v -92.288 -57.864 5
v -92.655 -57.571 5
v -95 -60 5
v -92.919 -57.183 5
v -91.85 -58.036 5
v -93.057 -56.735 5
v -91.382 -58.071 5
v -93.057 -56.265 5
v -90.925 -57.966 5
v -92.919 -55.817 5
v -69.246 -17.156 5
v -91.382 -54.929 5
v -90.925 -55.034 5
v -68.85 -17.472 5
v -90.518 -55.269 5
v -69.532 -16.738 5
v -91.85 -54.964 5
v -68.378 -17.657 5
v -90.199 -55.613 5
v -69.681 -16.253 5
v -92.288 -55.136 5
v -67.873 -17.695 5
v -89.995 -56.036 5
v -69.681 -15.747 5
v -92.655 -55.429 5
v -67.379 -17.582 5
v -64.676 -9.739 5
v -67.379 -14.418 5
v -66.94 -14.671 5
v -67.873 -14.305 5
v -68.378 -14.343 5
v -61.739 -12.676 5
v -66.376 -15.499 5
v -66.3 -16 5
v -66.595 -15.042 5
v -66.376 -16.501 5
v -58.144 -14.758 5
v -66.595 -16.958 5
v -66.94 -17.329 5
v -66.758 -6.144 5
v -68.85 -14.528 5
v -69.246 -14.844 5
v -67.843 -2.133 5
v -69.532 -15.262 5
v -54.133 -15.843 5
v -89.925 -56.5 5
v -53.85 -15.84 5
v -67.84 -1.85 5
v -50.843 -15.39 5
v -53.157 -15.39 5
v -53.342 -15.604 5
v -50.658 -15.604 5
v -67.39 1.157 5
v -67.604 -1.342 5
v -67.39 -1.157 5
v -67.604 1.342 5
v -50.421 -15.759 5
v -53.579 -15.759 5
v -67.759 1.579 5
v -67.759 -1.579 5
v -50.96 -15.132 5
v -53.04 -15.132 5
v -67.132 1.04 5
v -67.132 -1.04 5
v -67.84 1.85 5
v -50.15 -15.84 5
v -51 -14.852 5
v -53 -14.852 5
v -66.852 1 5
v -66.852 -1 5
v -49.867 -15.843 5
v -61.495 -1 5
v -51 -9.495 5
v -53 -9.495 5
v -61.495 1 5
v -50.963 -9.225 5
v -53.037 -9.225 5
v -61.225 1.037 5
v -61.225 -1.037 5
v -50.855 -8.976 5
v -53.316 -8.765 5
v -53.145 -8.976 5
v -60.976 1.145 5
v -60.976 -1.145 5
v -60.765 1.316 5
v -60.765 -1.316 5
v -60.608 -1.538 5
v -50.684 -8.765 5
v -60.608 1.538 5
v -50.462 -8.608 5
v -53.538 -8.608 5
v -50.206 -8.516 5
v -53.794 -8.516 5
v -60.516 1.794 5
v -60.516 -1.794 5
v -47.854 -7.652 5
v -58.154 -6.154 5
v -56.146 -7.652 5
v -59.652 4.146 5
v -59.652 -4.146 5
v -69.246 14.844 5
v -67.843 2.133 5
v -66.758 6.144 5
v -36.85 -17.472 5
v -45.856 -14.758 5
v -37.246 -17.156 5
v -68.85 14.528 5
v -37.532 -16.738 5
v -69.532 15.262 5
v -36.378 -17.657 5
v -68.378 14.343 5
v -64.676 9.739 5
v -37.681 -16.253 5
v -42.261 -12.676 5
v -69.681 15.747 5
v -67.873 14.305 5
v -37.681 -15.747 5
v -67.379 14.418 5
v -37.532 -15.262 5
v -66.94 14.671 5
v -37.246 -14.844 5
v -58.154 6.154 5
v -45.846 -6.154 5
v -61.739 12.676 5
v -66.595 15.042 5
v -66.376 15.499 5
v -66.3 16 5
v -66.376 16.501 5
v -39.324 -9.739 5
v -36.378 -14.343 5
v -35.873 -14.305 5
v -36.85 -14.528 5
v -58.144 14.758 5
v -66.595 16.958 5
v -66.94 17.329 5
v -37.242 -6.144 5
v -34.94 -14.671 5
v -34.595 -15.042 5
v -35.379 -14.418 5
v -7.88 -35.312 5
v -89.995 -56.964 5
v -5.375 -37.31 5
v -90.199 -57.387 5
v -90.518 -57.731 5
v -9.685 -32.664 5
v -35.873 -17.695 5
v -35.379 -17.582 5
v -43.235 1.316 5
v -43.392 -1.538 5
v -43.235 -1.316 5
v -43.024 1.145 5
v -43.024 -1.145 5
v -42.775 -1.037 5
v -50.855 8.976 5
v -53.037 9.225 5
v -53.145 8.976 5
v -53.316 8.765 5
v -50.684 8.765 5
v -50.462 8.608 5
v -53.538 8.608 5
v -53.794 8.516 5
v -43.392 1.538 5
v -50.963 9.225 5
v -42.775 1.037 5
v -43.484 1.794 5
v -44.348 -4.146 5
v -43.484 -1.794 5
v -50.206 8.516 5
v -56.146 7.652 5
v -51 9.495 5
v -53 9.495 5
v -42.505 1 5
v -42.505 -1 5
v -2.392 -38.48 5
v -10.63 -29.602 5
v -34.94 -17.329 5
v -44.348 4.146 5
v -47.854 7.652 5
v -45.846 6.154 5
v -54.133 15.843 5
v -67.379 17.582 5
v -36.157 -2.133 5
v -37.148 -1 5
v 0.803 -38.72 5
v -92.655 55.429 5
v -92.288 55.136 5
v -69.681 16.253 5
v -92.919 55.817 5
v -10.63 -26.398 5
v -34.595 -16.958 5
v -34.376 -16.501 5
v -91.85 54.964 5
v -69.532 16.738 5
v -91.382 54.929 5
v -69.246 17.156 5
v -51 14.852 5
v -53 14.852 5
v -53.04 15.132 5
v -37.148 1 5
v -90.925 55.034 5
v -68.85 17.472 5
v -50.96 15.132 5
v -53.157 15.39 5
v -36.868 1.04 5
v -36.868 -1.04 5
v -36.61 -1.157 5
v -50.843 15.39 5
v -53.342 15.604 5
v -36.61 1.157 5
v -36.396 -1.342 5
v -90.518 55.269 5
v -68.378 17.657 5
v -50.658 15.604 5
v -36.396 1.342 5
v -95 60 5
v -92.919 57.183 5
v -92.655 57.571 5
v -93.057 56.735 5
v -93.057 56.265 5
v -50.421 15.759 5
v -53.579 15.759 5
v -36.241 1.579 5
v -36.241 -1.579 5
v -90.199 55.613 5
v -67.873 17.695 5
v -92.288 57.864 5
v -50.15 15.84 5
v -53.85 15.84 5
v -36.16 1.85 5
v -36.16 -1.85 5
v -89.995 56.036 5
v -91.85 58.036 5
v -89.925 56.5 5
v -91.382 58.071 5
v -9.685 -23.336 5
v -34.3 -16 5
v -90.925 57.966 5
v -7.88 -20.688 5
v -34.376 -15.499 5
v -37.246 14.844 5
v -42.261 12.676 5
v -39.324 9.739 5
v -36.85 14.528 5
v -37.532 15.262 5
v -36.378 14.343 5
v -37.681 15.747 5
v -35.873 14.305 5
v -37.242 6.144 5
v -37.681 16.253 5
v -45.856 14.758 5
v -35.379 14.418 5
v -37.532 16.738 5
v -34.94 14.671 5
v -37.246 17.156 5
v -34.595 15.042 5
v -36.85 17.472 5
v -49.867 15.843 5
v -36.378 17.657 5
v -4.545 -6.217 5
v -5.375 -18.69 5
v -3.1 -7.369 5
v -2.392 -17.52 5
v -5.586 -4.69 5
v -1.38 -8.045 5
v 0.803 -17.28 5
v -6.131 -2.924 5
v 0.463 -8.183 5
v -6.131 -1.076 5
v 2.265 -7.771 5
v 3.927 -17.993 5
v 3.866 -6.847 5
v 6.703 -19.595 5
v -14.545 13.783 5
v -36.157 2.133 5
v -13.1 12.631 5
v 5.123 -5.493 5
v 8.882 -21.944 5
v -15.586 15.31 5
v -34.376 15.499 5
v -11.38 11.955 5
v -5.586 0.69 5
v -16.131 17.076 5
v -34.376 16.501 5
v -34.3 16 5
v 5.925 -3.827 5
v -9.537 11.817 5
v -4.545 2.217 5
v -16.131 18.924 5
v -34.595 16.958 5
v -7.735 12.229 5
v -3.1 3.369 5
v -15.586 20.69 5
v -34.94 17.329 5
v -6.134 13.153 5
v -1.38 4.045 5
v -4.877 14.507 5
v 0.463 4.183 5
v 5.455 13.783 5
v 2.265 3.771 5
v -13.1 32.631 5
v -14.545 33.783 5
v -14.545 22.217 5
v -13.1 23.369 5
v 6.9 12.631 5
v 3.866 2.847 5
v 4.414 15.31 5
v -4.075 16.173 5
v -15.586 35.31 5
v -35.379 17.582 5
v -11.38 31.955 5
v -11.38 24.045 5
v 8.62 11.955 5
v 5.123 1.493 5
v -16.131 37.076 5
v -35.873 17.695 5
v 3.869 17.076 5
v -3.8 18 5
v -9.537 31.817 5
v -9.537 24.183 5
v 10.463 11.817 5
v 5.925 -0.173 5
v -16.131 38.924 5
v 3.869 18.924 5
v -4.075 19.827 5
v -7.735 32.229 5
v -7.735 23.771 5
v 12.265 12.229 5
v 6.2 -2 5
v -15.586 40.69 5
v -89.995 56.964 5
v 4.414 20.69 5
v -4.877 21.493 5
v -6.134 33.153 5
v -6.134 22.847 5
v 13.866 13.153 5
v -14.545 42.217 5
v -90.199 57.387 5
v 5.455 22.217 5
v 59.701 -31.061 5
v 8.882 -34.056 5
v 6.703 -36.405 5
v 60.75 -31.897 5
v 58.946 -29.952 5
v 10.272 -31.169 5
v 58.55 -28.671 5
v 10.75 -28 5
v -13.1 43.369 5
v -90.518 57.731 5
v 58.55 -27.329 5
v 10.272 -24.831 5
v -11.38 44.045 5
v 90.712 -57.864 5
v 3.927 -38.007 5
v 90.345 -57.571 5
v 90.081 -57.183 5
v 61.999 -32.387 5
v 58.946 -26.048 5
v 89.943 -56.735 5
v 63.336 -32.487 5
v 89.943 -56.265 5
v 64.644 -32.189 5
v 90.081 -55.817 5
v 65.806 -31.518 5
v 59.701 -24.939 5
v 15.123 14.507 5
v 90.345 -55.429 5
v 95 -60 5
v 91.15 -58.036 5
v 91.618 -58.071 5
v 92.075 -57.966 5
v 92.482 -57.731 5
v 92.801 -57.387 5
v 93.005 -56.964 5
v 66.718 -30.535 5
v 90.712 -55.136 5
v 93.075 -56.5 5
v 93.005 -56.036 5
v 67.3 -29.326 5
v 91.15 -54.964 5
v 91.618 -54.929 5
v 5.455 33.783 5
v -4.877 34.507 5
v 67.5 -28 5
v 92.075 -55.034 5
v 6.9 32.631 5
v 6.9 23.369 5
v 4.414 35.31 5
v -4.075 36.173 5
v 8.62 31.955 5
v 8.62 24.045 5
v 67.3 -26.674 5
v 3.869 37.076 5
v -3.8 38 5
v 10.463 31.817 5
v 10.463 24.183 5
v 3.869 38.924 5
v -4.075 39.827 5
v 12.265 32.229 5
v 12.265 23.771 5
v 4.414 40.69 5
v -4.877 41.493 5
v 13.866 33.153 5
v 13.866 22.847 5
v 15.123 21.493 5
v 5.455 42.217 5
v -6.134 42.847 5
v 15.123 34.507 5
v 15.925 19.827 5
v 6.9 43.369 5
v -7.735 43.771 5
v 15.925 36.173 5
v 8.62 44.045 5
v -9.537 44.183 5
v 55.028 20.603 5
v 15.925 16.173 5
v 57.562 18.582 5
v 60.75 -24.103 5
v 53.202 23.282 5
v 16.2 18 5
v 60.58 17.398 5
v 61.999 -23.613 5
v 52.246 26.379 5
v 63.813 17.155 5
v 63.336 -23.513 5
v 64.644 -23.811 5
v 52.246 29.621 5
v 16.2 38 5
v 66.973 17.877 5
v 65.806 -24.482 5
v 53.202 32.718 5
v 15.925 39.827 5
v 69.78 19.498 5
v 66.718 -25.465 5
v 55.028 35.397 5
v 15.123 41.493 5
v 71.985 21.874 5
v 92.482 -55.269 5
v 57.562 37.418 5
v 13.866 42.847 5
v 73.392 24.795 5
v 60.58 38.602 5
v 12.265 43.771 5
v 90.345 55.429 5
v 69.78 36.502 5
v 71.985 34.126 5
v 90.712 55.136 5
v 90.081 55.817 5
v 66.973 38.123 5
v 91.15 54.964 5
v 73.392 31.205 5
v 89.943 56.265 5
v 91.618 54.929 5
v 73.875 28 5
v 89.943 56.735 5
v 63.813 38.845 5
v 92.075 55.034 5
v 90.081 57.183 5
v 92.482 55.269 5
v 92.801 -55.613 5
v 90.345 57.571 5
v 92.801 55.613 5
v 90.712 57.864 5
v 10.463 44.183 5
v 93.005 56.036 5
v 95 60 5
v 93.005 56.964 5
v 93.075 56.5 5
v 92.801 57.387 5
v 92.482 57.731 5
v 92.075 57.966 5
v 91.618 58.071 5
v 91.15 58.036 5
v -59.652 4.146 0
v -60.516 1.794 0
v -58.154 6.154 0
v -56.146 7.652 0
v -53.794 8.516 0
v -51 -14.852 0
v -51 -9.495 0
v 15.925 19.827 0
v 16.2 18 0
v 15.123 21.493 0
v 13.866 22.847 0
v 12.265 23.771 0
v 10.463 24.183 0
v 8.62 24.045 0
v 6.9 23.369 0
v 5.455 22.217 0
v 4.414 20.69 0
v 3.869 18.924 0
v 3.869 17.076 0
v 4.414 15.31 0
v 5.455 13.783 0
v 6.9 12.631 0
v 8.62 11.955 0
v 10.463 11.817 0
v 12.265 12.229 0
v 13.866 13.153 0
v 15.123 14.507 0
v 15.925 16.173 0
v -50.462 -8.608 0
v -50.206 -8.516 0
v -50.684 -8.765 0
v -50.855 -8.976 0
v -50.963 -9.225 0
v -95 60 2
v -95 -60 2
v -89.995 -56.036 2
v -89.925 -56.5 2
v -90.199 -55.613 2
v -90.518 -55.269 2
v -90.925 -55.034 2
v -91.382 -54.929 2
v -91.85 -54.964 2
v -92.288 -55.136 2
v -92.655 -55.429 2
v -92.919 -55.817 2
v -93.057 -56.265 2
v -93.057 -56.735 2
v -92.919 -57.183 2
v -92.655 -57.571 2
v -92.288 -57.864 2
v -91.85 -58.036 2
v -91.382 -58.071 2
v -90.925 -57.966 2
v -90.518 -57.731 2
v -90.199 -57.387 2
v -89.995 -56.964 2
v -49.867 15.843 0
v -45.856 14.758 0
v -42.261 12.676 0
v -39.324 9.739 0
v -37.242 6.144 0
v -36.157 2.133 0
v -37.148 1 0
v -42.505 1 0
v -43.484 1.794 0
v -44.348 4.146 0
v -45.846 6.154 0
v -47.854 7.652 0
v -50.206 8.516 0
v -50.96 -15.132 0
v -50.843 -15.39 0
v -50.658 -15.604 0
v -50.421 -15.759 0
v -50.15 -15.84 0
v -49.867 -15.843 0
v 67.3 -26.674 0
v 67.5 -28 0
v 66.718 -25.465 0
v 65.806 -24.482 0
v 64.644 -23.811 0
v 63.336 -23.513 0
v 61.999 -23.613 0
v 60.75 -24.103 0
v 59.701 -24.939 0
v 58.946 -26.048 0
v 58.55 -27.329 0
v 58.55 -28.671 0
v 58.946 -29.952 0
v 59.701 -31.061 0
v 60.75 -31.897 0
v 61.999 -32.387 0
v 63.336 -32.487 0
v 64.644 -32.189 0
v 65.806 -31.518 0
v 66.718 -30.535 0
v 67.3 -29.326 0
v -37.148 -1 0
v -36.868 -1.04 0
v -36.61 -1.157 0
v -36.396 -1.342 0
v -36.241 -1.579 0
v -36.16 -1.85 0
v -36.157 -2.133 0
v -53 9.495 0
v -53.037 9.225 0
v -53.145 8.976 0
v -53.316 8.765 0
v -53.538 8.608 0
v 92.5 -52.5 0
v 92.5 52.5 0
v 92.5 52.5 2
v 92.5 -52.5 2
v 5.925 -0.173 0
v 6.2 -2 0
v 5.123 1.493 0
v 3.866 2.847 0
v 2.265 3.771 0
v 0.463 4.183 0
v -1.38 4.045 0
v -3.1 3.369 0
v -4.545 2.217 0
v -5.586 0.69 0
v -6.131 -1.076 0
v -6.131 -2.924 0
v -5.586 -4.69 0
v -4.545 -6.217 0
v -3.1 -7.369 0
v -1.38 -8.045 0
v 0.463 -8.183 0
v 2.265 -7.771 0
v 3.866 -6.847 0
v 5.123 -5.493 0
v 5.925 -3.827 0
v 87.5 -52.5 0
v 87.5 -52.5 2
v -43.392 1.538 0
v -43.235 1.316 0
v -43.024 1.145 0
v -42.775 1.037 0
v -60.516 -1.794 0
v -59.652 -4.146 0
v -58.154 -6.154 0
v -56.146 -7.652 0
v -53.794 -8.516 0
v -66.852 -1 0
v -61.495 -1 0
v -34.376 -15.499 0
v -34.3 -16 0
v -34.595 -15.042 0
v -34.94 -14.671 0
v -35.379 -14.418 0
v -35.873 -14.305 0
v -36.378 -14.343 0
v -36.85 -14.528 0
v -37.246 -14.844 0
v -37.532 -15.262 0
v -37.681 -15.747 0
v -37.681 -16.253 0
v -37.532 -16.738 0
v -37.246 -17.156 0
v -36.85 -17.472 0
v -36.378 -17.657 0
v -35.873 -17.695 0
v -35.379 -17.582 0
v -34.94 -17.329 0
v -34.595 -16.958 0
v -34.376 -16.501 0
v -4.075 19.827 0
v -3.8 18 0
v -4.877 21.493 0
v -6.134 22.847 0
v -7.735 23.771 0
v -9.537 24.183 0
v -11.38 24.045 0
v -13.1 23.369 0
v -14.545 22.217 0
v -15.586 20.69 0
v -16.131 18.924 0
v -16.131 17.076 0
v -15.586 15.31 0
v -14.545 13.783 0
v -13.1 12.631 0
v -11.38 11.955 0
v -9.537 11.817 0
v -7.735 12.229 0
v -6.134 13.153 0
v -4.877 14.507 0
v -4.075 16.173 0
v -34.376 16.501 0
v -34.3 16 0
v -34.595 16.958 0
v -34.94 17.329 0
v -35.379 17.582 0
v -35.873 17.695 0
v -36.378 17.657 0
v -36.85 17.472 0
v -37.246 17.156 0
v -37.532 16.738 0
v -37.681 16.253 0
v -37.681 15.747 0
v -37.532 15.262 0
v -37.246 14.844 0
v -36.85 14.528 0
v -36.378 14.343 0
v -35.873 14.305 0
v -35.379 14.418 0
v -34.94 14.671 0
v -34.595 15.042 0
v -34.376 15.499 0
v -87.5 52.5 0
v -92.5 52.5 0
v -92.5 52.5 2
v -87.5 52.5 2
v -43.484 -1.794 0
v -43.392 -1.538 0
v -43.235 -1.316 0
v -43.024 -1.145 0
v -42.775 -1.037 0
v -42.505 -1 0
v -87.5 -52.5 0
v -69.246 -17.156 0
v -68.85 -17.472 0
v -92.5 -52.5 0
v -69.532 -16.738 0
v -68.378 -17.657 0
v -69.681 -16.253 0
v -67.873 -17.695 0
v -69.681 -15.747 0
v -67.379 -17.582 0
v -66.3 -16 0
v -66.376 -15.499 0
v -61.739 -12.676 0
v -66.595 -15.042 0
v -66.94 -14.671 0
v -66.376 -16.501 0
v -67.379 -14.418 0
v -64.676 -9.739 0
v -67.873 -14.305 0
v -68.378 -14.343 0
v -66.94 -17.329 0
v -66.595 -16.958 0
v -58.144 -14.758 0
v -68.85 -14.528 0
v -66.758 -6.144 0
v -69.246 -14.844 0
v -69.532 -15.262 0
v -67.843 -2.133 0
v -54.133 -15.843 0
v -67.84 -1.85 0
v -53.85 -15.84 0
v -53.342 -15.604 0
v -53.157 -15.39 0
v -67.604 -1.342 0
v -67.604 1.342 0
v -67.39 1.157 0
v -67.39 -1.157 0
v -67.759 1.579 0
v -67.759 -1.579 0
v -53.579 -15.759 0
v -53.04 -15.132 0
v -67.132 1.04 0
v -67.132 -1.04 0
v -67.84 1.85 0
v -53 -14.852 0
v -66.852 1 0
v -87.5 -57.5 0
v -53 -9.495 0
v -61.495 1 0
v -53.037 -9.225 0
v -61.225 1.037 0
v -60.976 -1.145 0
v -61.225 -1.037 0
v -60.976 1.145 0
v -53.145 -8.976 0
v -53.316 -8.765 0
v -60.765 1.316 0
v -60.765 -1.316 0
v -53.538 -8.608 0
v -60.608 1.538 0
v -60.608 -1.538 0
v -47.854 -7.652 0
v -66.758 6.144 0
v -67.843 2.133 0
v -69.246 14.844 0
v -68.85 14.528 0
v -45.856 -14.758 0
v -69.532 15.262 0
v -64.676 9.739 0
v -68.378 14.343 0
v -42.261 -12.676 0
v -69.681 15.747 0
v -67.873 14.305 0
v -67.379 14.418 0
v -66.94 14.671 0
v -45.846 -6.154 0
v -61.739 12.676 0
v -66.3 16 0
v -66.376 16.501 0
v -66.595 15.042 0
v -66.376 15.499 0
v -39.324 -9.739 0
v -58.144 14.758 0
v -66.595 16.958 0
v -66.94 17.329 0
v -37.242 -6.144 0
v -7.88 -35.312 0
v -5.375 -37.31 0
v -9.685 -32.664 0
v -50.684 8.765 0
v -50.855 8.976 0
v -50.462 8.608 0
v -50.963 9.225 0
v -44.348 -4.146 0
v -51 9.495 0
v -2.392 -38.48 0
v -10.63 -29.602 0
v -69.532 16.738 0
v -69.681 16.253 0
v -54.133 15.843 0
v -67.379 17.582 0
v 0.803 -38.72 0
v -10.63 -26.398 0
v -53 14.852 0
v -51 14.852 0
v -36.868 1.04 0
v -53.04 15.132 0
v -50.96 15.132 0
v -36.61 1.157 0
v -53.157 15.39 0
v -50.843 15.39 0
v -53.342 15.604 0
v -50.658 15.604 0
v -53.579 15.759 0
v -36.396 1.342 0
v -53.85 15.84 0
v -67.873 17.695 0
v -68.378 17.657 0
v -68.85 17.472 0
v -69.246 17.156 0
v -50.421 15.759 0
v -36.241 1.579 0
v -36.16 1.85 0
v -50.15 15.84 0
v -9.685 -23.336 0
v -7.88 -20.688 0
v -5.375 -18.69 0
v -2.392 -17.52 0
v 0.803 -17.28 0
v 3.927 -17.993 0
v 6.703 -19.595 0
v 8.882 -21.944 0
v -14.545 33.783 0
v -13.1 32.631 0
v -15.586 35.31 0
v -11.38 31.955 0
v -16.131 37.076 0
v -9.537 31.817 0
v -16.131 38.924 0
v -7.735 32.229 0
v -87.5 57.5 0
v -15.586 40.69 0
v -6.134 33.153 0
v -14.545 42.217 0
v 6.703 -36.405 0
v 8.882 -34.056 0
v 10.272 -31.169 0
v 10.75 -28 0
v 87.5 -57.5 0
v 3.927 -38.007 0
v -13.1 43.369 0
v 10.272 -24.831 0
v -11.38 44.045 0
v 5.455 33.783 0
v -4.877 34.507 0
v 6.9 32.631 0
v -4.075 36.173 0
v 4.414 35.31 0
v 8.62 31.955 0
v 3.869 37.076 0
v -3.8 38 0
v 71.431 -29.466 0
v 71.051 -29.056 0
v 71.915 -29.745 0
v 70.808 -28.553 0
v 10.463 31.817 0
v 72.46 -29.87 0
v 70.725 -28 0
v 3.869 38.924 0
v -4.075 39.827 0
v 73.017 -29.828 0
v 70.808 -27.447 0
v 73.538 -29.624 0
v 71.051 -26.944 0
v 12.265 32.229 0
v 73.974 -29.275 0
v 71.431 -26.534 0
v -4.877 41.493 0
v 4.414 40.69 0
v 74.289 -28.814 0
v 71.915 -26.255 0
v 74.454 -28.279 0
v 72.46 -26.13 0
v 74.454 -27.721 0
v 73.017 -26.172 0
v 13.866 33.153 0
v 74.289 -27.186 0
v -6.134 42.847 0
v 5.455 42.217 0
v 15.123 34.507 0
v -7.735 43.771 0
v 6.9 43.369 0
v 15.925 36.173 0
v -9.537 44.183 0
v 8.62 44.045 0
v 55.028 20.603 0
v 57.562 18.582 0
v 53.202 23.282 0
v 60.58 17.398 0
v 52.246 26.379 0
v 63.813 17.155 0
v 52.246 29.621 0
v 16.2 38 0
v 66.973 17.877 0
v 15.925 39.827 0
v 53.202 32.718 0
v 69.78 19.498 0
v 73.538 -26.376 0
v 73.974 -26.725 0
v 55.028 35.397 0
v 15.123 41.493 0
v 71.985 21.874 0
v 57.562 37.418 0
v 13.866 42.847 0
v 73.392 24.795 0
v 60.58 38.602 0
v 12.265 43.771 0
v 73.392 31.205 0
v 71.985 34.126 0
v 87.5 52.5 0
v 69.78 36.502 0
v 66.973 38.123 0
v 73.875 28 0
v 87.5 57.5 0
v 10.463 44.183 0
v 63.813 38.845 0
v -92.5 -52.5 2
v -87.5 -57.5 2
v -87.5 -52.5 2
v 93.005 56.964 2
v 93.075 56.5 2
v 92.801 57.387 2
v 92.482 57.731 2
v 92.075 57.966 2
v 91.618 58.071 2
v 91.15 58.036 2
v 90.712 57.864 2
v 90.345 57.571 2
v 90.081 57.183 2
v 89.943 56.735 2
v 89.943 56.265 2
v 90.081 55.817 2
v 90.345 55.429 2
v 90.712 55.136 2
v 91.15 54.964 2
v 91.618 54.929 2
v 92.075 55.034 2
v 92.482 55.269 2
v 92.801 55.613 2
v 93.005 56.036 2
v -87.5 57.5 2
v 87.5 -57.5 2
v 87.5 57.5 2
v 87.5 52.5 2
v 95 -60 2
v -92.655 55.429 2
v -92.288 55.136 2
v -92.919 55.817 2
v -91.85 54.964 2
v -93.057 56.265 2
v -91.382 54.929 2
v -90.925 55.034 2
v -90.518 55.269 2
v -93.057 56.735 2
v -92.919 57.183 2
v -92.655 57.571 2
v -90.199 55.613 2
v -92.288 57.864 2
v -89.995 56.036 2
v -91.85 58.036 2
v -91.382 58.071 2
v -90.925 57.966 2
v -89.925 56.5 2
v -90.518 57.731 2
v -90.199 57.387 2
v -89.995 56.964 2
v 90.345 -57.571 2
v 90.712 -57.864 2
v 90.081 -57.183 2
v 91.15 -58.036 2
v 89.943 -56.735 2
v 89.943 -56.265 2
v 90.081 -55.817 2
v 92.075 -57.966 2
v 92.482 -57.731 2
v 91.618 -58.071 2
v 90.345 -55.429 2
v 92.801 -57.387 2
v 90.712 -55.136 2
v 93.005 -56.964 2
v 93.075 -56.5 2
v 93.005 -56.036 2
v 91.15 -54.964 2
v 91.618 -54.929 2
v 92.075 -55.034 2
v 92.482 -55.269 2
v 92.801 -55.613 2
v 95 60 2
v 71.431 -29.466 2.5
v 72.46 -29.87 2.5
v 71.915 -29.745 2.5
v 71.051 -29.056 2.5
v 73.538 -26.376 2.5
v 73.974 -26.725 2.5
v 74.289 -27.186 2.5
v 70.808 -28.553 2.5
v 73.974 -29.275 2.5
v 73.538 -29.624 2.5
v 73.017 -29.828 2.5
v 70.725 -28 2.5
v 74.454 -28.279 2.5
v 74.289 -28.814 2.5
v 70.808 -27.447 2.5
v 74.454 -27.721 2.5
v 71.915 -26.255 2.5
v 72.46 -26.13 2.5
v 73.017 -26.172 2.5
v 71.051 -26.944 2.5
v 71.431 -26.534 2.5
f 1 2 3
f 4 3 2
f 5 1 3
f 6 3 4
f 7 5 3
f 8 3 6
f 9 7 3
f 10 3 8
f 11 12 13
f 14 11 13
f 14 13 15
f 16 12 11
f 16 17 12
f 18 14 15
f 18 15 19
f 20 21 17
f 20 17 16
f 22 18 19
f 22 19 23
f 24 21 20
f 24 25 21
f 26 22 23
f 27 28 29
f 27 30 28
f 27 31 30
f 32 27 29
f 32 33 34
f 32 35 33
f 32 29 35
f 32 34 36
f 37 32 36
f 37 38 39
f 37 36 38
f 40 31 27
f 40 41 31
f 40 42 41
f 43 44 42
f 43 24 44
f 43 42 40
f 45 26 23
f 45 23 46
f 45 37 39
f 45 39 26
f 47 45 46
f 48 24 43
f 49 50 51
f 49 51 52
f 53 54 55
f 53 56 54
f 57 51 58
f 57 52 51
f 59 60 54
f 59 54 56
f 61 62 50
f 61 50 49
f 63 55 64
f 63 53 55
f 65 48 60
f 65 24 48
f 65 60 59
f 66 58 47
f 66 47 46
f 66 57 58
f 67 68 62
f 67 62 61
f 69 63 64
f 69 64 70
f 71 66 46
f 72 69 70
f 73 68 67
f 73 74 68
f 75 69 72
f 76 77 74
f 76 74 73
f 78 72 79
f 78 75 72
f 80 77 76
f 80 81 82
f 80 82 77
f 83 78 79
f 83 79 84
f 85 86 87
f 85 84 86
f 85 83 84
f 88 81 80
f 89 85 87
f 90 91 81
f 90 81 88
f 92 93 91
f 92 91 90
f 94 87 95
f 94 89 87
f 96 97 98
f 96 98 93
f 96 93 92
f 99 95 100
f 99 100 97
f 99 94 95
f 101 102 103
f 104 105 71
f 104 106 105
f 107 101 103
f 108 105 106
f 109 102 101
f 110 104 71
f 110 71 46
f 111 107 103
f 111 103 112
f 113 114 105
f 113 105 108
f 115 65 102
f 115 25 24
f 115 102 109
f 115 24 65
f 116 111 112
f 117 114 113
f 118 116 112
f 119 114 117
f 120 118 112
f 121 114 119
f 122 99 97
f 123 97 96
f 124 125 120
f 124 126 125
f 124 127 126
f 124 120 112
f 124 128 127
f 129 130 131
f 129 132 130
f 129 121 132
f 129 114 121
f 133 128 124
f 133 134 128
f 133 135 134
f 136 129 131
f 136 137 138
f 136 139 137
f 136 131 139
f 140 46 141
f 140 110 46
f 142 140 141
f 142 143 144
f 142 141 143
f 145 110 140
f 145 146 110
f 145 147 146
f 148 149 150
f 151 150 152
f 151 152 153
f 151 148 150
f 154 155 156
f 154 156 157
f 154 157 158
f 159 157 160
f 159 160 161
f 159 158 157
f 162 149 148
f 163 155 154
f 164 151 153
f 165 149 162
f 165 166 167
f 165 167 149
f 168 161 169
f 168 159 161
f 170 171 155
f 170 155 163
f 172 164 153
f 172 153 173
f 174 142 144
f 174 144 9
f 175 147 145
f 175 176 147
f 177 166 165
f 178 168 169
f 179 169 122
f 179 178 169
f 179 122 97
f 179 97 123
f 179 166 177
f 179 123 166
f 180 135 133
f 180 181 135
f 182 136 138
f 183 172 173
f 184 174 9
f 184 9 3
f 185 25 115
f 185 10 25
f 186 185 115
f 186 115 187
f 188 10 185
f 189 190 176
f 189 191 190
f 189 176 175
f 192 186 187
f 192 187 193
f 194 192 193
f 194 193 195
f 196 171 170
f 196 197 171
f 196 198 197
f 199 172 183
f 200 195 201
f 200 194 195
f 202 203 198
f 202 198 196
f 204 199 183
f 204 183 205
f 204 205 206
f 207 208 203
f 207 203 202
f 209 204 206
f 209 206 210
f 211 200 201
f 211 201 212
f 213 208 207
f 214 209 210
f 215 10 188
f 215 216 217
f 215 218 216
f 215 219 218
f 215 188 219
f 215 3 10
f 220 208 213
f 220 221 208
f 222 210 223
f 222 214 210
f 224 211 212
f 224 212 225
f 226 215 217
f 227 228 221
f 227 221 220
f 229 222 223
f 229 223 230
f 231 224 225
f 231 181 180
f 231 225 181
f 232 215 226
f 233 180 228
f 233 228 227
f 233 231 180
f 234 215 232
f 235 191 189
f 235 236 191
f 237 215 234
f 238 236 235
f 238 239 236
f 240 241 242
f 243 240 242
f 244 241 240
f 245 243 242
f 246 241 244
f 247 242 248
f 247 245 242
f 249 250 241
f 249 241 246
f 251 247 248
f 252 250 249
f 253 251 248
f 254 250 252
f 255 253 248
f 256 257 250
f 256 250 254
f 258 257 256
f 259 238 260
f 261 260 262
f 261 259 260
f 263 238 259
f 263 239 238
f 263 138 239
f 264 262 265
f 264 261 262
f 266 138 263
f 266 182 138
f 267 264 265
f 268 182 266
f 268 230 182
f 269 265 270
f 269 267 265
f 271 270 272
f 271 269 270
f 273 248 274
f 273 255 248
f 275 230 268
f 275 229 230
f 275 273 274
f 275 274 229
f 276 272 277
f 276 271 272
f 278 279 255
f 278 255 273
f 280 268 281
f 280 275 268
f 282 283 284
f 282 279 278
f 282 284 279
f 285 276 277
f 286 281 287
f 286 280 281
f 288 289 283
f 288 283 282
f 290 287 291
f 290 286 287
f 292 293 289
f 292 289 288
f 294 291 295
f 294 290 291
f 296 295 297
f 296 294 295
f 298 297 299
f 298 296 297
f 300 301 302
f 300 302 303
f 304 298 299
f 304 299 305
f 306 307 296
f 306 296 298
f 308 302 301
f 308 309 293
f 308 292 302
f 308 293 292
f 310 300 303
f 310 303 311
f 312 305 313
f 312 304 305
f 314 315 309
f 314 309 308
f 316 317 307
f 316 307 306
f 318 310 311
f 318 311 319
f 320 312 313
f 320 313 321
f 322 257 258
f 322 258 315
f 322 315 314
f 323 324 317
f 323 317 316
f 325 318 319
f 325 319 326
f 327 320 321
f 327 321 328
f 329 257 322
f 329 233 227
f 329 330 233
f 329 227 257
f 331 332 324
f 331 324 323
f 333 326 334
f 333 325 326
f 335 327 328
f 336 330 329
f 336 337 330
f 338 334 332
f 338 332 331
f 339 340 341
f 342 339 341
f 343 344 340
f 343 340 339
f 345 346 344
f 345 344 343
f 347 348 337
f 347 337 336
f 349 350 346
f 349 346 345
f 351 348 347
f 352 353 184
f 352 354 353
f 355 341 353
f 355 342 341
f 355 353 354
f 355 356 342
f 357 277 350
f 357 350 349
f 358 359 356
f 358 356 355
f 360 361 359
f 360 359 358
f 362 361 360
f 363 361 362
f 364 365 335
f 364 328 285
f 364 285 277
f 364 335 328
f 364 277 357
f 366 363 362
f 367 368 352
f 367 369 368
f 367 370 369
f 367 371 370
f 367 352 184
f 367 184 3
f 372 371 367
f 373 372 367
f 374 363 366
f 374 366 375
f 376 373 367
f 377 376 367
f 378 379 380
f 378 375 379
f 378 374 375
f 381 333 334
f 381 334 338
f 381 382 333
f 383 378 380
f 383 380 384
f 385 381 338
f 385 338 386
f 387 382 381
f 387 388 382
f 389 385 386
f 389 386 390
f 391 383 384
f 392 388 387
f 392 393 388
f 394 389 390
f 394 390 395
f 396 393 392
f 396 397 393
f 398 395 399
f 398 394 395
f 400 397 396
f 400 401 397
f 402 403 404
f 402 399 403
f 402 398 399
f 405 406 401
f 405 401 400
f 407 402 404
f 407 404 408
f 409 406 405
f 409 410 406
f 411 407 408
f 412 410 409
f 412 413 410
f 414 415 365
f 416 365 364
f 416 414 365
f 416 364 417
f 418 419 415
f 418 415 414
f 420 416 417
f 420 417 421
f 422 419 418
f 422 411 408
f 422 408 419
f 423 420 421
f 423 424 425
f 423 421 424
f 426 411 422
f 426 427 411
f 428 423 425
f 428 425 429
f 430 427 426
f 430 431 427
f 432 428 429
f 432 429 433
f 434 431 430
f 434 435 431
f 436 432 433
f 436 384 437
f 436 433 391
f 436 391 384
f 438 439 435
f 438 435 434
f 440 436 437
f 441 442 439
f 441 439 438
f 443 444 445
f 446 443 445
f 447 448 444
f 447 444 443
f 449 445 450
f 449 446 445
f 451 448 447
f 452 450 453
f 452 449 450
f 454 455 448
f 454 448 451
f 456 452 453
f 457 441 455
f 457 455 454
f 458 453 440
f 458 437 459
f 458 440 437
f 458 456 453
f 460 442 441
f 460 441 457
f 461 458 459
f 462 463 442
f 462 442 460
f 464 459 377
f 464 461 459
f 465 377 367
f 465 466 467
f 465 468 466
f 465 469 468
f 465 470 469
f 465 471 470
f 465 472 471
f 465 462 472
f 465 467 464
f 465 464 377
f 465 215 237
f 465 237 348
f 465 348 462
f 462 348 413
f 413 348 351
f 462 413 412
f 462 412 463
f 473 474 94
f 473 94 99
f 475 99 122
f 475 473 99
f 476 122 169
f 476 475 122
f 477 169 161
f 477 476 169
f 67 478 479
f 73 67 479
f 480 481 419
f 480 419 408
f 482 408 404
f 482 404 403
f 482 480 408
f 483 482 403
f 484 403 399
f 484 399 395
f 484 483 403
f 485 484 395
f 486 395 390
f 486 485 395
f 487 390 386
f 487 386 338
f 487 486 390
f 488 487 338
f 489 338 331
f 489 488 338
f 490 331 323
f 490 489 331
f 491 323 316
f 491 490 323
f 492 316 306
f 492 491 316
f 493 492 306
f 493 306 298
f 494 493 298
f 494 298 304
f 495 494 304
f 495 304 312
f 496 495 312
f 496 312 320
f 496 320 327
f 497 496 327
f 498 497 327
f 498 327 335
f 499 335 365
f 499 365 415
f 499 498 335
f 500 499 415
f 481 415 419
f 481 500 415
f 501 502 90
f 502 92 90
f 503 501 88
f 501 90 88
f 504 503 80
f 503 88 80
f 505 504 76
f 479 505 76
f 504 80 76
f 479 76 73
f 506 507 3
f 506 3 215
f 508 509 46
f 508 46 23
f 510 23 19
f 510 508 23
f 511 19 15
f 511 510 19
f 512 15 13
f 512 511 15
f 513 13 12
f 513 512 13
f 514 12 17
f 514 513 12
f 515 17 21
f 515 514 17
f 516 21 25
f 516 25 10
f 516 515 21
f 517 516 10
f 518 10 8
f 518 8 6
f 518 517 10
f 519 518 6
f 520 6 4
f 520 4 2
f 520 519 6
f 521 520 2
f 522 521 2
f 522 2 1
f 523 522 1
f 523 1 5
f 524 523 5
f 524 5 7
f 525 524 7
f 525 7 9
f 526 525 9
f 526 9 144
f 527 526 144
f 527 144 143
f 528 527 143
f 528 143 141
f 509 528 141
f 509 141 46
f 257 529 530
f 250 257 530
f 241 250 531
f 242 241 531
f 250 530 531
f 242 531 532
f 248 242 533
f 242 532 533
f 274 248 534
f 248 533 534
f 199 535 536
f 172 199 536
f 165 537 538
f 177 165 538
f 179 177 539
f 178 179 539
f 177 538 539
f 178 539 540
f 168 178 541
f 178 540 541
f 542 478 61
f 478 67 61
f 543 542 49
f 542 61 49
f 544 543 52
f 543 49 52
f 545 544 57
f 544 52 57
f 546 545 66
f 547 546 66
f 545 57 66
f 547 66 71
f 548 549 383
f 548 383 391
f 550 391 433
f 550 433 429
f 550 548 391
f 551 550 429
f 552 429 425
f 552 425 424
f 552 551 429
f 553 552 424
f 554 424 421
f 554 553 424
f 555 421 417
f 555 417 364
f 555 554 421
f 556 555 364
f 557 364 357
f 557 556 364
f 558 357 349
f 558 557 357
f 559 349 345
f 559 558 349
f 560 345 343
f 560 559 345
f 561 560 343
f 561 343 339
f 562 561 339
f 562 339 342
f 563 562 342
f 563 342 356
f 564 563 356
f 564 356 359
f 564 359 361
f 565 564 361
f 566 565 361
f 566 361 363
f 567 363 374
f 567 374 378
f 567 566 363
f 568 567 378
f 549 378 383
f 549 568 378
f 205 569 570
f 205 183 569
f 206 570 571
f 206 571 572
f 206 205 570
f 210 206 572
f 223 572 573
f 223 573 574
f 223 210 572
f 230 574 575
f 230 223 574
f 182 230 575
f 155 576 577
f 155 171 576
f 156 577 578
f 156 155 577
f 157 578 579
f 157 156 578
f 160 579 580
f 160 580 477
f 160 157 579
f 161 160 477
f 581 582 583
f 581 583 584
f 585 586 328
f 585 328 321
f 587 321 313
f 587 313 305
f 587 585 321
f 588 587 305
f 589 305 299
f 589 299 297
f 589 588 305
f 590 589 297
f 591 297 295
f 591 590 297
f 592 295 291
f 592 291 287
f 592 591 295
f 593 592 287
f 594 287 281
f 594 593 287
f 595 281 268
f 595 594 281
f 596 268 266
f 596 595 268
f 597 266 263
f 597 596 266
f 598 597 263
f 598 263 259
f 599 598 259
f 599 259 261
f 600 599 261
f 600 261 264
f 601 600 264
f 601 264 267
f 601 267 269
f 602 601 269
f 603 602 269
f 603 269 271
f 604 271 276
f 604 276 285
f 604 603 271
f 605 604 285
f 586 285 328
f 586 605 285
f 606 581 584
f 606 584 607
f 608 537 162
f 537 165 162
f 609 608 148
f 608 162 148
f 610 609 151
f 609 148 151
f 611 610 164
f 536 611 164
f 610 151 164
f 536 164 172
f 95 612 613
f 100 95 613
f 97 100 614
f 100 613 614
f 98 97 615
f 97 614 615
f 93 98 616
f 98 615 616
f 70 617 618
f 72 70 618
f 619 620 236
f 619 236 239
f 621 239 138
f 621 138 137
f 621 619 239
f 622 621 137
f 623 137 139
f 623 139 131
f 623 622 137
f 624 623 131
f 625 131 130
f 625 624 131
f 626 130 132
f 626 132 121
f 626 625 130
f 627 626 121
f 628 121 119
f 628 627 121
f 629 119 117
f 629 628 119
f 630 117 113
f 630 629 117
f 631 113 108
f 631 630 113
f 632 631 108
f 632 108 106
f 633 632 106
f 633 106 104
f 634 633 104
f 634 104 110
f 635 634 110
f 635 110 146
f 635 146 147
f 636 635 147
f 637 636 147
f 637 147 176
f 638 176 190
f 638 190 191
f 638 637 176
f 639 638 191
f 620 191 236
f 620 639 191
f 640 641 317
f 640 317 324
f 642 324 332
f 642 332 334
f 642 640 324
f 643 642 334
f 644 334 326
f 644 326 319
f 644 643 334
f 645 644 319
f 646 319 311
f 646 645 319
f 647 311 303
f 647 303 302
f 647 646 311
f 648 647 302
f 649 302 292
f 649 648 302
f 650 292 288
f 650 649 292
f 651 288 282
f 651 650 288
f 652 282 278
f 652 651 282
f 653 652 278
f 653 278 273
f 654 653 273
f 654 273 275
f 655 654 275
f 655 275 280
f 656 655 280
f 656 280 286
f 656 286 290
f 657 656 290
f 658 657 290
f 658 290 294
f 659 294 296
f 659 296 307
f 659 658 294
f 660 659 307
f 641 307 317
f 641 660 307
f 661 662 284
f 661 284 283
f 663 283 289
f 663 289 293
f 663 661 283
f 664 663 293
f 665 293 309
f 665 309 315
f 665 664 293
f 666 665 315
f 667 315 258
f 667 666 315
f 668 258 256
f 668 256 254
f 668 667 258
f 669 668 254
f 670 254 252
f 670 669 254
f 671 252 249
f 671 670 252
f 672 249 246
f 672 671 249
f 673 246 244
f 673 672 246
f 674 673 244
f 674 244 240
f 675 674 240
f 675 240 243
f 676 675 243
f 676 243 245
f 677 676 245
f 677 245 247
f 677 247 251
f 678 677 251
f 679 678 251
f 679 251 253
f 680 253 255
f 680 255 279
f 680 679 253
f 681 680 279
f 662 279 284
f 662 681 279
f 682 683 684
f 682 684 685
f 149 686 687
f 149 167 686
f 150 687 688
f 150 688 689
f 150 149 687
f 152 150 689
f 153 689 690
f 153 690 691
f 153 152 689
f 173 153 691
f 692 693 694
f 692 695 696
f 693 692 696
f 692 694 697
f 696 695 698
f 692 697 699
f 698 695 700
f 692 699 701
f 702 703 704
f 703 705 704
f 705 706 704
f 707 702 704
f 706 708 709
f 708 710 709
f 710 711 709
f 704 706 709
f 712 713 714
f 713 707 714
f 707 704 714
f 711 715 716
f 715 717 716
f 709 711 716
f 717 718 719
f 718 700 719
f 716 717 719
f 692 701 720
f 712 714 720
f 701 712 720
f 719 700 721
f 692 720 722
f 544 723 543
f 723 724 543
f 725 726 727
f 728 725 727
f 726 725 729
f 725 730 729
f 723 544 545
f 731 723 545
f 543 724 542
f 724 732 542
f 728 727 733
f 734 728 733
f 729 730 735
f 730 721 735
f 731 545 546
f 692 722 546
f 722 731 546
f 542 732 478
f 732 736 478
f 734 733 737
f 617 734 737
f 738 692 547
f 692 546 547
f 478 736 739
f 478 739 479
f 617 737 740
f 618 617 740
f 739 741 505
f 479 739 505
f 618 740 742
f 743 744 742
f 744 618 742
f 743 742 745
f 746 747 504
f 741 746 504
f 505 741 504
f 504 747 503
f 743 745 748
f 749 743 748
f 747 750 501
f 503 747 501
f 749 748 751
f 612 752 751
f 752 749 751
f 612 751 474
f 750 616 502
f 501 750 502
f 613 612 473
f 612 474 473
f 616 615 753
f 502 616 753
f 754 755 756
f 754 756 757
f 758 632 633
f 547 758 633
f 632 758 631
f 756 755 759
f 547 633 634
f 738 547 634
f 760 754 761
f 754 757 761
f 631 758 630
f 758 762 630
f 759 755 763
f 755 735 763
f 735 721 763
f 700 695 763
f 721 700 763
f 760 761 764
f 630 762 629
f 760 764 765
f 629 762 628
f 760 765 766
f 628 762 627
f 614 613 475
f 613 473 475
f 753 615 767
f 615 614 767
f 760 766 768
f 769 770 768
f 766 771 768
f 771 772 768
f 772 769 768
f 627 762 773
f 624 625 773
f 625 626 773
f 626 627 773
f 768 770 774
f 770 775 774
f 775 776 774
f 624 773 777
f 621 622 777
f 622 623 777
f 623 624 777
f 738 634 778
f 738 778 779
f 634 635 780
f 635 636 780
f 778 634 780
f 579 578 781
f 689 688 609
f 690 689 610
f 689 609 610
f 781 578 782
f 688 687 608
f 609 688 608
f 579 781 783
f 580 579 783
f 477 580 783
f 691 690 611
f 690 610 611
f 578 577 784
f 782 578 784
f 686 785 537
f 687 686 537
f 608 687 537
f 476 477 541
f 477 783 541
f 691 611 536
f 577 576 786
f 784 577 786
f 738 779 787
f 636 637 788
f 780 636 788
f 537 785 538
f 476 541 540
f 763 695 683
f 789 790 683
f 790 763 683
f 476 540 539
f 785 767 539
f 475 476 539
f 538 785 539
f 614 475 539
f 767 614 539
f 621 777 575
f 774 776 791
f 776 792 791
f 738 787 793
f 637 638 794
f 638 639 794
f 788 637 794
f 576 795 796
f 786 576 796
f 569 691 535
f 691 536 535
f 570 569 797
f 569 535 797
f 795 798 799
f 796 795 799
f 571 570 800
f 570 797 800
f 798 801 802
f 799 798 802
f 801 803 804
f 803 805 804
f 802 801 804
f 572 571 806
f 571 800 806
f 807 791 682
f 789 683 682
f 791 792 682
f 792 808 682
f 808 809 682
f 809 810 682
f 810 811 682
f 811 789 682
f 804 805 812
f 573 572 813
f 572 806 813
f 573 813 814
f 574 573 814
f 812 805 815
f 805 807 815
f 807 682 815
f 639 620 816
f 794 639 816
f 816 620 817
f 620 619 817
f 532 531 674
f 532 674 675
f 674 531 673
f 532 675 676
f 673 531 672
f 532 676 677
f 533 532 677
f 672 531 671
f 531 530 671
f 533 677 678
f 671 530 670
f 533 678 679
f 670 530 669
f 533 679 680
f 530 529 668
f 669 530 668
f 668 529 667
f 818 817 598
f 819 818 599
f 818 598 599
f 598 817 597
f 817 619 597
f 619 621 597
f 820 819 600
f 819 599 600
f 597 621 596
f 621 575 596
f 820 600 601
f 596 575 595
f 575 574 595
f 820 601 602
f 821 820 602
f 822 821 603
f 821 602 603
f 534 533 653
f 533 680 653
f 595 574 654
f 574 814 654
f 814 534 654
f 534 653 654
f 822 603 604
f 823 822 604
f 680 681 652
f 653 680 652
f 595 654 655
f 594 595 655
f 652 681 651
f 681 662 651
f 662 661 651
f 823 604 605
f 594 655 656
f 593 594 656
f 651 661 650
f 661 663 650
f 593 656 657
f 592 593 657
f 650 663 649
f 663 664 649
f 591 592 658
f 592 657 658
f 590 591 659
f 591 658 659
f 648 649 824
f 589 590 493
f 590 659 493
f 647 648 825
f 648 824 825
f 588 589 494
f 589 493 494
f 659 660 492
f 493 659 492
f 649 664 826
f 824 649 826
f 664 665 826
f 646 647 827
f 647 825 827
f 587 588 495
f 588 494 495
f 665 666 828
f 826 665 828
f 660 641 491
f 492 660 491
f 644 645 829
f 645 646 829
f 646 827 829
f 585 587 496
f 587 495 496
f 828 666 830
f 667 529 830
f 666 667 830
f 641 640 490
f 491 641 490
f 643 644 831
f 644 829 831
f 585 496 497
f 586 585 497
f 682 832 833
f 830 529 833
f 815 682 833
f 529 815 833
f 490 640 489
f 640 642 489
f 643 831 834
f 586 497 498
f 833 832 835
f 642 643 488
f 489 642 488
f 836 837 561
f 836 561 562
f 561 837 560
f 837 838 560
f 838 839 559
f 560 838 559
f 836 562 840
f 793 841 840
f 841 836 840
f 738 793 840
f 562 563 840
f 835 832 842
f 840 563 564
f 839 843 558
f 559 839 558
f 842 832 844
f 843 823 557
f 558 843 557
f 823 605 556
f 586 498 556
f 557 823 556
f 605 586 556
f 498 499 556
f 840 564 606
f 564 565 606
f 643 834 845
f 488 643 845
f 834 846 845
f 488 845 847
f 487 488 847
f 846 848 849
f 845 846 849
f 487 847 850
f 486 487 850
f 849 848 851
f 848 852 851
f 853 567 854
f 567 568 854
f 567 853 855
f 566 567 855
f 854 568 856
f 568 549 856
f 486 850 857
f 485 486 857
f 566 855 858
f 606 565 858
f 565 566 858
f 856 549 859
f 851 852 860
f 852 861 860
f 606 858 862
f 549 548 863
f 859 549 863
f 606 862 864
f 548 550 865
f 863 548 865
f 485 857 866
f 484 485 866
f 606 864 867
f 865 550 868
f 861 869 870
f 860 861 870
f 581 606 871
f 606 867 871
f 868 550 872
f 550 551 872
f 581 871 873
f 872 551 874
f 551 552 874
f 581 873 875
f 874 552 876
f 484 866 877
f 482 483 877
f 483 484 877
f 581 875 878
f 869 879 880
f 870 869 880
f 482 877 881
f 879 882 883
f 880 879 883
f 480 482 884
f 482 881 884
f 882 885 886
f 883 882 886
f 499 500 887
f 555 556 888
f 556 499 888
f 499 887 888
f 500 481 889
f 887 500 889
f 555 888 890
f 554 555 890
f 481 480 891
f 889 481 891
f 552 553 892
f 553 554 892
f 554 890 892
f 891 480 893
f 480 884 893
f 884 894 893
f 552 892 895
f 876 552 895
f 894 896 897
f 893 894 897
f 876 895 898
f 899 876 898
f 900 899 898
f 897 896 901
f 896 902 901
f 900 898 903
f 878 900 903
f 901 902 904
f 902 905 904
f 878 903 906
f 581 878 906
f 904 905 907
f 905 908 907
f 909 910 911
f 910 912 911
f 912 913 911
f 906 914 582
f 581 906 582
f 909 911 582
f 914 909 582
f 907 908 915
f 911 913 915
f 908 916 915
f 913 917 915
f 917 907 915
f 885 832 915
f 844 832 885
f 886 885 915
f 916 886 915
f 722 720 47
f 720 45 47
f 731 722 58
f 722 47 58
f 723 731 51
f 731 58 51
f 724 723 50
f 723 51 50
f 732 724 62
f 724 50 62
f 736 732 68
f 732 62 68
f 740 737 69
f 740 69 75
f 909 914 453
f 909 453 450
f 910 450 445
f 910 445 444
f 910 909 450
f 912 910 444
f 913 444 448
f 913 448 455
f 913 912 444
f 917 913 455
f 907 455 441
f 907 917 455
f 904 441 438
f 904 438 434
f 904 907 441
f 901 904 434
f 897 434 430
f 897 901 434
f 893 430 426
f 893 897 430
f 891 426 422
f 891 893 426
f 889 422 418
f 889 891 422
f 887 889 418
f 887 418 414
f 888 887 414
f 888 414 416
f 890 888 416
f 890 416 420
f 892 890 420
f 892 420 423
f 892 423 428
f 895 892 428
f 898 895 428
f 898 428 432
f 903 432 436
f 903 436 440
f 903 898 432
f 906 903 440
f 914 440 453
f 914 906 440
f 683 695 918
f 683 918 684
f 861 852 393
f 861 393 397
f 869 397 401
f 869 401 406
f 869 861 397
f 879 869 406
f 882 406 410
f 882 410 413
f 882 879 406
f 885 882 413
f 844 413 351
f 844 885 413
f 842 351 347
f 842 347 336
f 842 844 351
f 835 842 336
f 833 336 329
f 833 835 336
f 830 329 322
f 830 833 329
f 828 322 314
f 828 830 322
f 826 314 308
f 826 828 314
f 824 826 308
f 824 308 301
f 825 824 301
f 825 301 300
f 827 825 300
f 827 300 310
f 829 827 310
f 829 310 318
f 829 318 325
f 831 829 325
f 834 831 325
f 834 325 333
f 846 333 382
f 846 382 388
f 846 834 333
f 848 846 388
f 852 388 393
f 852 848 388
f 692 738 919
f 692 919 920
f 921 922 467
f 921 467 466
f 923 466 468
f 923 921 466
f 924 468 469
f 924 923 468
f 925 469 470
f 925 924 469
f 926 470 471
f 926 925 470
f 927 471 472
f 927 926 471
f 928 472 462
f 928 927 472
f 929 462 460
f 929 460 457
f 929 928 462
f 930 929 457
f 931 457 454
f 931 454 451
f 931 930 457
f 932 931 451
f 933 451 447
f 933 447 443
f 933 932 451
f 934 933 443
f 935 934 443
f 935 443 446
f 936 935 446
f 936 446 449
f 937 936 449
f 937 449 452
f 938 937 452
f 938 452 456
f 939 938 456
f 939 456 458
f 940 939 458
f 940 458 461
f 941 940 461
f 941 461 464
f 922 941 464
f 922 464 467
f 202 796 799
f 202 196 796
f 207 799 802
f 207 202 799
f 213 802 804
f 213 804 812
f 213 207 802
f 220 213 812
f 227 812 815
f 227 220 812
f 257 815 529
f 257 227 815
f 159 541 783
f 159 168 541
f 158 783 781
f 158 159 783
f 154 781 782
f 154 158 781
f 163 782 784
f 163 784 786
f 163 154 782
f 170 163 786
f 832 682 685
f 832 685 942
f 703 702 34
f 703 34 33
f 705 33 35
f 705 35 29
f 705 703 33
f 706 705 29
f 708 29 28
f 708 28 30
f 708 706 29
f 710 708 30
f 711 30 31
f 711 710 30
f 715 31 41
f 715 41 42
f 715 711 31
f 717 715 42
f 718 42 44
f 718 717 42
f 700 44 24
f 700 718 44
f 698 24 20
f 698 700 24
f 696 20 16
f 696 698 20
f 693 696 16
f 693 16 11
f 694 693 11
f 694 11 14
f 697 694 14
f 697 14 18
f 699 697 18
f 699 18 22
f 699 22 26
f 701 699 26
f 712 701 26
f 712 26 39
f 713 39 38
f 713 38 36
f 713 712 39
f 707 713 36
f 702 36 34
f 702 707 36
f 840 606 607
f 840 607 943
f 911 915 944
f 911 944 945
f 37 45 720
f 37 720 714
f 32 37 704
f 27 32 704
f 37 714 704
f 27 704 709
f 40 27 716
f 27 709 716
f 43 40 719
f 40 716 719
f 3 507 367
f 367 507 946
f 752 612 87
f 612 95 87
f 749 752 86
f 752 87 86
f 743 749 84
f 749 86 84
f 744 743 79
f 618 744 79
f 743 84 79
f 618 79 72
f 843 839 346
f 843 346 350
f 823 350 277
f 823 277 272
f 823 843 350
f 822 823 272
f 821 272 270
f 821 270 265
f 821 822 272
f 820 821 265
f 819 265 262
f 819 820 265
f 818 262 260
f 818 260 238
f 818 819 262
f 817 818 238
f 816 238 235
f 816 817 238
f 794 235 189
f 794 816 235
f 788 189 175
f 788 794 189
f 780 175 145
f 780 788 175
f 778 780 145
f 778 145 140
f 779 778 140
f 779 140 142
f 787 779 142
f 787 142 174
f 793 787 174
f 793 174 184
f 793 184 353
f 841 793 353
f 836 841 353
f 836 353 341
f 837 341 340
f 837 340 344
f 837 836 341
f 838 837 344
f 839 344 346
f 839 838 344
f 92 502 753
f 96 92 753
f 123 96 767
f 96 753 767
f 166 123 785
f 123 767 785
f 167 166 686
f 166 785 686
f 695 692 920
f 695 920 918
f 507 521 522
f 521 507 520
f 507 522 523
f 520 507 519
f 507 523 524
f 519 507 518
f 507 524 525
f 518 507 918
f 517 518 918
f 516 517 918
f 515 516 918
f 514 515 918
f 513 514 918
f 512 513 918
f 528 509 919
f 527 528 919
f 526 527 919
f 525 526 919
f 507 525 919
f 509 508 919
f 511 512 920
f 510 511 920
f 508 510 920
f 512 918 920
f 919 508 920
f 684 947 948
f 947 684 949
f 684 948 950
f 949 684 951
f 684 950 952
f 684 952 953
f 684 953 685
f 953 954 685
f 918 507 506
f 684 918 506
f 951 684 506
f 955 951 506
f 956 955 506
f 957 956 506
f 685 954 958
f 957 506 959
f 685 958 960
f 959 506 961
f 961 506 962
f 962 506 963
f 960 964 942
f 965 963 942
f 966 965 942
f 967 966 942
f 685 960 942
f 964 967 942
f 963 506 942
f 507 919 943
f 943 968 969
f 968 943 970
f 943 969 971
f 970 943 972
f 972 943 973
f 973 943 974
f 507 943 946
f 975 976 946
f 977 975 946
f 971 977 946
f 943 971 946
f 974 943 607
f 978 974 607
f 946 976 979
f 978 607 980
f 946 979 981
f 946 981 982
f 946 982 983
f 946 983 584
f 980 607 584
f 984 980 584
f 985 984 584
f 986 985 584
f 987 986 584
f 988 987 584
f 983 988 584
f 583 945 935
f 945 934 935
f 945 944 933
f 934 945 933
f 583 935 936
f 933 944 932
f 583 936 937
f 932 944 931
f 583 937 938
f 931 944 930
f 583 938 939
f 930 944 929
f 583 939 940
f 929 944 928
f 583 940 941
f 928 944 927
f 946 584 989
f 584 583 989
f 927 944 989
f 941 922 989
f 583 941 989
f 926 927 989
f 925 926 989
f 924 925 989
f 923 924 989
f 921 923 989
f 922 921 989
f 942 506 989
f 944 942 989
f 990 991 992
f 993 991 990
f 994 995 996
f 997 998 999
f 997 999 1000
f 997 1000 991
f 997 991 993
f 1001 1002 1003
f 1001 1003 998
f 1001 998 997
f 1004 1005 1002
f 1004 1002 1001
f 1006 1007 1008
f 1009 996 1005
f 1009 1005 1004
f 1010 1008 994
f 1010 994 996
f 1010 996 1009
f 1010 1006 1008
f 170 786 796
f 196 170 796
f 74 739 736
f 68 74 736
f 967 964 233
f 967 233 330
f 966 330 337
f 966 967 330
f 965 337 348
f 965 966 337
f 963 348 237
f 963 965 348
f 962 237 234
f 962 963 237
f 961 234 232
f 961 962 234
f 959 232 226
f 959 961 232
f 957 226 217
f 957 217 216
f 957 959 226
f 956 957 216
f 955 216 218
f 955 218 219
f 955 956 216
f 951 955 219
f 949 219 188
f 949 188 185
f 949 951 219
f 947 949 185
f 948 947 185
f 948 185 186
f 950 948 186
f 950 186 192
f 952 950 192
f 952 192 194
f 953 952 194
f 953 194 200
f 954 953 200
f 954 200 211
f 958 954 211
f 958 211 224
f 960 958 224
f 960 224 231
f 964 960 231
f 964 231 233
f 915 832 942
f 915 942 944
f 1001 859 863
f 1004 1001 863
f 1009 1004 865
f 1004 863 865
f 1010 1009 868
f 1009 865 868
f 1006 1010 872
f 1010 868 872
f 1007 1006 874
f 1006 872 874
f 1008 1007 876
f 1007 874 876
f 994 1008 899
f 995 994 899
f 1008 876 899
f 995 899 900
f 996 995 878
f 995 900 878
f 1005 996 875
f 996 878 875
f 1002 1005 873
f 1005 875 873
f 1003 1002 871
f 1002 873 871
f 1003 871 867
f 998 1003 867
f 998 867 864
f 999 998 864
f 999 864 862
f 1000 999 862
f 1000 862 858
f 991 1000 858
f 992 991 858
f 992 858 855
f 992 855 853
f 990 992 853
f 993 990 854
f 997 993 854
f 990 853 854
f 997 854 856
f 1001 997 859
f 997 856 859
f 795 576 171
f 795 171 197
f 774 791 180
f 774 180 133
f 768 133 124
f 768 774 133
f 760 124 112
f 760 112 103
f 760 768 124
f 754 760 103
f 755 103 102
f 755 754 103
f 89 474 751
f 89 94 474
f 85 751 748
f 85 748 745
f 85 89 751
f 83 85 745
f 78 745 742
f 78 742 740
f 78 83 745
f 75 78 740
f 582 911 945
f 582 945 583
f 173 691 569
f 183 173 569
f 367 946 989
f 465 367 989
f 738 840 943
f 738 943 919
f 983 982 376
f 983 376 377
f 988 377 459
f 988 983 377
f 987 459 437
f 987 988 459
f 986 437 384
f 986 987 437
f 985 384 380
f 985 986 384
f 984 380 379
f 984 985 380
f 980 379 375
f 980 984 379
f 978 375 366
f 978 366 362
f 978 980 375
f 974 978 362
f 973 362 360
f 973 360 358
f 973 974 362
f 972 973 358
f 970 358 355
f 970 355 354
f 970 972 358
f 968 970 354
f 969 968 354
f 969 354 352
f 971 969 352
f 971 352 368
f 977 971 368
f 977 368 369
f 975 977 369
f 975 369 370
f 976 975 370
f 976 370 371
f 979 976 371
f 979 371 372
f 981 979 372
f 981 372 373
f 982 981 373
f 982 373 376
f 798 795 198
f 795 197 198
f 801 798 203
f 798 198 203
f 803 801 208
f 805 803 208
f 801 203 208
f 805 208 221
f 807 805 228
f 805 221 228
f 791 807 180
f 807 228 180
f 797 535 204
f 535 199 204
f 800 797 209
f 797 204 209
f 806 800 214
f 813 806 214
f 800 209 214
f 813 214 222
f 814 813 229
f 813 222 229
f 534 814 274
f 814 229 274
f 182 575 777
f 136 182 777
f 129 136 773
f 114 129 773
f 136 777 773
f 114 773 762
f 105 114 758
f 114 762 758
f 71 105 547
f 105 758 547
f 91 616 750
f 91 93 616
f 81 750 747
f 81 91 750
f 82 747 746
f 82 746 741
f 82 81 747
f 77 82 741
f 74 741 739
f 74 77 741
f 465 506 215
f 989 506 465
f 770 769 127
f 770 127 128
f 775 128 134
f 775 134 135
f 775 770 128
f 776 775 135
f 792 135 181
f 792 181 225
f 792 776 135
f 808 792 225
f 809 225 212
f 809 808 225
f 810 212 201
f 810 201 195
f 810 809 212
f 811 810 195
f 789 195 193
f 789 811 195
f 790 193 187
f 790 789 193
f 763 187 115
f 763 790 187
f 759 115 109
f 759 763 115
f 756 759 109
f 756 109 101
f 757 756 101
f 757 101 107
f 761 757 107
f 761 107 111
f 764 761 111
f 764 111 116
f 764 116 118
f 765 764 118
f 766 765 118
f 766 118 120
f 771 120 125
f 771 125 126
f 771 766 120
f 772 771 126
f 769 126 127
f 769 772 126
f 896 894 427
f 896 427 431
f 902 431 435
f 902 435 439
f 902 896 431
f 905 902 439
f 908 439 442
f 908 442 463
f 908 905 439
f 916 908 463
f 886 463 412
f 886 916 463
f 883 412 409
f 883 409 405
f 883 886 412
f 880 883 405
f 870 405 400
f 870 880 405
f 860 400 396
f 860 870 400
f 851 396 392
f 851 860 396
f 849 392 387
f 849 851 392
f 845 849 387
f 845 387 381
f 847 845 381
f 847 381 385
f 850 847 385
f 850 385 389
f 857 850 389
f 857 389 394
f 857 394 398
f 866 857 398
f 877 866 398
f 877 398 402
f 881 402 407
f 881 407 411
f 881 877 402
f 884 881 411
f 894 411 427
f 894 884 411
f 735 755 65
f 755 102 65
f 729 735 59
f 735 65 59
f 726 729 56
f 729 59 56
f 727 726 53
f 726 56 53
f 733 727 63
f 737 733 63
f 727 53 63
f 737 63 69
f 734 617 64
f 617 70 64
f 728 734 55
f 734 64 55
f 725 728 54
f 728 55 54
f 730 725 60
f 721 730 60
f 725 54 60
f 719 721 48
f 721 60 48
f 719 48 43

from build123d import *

# Parameters (mm, degrees)
SKETCH1_W               = 190
SKETCH1_H               = 120
SKETCH1_R               = 1.575
SKETCH1_R_2             = 1.7
SKETCH1_R_3             = 10.875
SKETCH1_R_4             = 10.75
SKETCH1_R_5             = 4.5
SKETCH1_R_6             = 6.2
BOSS_EXTRUDE1_DEPTH     = 5
SKETCH5_W               = 190
SKETCH5_H               = 120
CUT_EXTRUDE3_DEPTH      = 2
CUT_EXTRUDE3_DEPTH_BACK = 1
FILLET1_R               = 1
SKETCH6_R               = 1.875
CUT_EXTRUDE4_DEPTH      = 2.5


with BuildPart() as part:
    # Sketch1 → Boss-Extrude1 (new body)
    with BuildSketch(Plane.XY):
        Rectangle(SKETCH1_W, SKETCH1_H)
        with Locations((-91.5, 56.5)):
            Circle(SKETCH1_R, mode=Mode.SUBTRACT)
        with Locations((91.5, 56.5)):
            Circle(SKETCH1_R, mode=Mode.SUBTRACT)
        with Locations((91.5, -56.5)):
            Circle(SKETCH1_R, mode=Mode.SUBTRACT)
        with Locations((-91.5, -56.5)):
            Circle(SKETCH1_R, mode=Mode.SUBTRACT)
        with Locations((-36, 16)):
            Circle(SKETCH1_R_2, mode=Mode.SUBTRACT)
        with Locations((-36, -16)):
            Circle(SKETCH1_R_2, mode=Mode.SUBTRACT)
        with Locations((-68, -16)):
            Circle(SKETCH1_R_2, mode=Mode.SUBTRACT)
        with Locations((-68, 16)):
            Circle(SKETCH1_R_2, mode=Mode.SUBTRACT)
        with Locations((63, 28)):
            Circle(SKETCH1_R_3, mode=Mode.SUBTRACT)
        with Locations((0, -28)):
            Circle(SKETCH1_R_4, mode=Mode.SUBTRACT)
        with Locations((63, -28)):
            Circle(SKETCH1_R_5, mode=Mode.SUBTRACT)
        with Locations((-10, 38)):
            Circle(SKETCH1_R_6, mode=Mode.SUBTRACT)
        with Locations((10, 18)):
            Circle(SKETCH1_R_6, mode=Mode.SUBTRACT)
        with Locations((0, -2)):
            Circle(SKETCH1_R_6, mode=Mode.SUBTRACT)
        with Locations((-10, 18)):
            Circle(SKETCH1_R_6, mode=Mode.SUBTRACT)
        with Locations((10, 38)):
            Circle(SKETCH1_R_6, mode=Mode.SUBTRACT)
        with BuildLine():
            Line((-53, 8.645421567), (-53, 15.954278592))
            ThreePointArc((-53, 15.954278592), (-63.303517271, 11.303517271), (-67.954278592, 1))
            Line((-67.954278592, 1), (-60.645421567, 1))
            ThreePointArc((-60.645421567, 1), (-58.153995209, 6.153995209), (-53, 8.645421567))
        make_face(mode=Mode.SUBTRACT)
        with BuildLine():
            Line((-51, 8.645421567), (-51, 15.954278592))
            ThreePointArc((-51, 15.954278592), (-40.696482729, 11.303517271), (-36.045721408, 1))
            Line((-36.045721408, 1), (-43.354578433, 1))
            ThreePointArc((-43.354578433, 1), (-45.846004791, 6.153995209), (-51, 8.645421567))
        make_face(mode=Mode.SUBTRACT)
        with BuildLine():
            Line((-43.354578433, -1), (-36.045721408, -1))
            ThreePointArc((-36.045721408, -1), (-40.696482729, -11.303517271), (-51, -15.954278592))
            Line((-51, -15.954278592), (-51, -8.645421567))
            ThreePointArc((-51, -8.645421567), (-45.846004791, -6.153995209), (-43.354578433, -1))
        make_face(mode=Mode.SUBTRACT)
        with BuildLine():
            Line((-53, -8.645421567), (-53, -15.954278592))
            ThreePointArc((-53, -15.954278592), (-63.303517271, -11.303517271), (-67.954278592, -1))
            Line((-67.954278592, -1), (-60.645421567, -1))
            ThreePointArc((-60.645421567, -1), (-58.153995209, -6.153995209), (-53, -8.645421567))
        make_face(mode=Mode.SUBTRACT)
    extrude(amount=BOSS_EXTRUDE1_DEPTH)

    # Sketch5 → Cut-Extrude3 (cut, two sides)
    with BuildSketch(Plane.XY) as cut_extrude3_sk:
        Rectangle(SKETCH5_W, SKETCH5_H)
        Polygon((-87.5, 57.5), (87.5, 57.5), (87.5, 52.5), (92.5, 52.5), (92.5, -52.5), (87.5, -52.5), (87.5, -57.5), (-87.5, -57.5), (-87.5, -52.5), (-92.5, -52.5), (-92.5, 52.5), (-87.5, 52.5), align=None, mode=Mode.SUBTRACT)
    extrude(amount=CUT_EXTRUDE3_DEPTH, mode=Mode.SUBTRACT)
    extrude(cut_extrude3_sk.sketch, amount=-CUT_EXTRUDE3_DEPTH_BACK, mode=Mode.SUBTRACT)

    # Fillet1
    fillet1_edges = [part.edges().sort_by_distance(p)[0] for p in [
        (-43.354578433, -1, 2.5),
        (-51, -8.645421567, 2.5),
        (-51, -15.954278592, 2.5),
        (-36.045721408, -1, 2.5),
        (-53, -8.645421567, 2.5),
        (-60.645421567, -1, 2.5),
        (-67.954278592, -1, 2.5),
        (-53, -15.954278592, 2.5),
        (-60.645421567, 1, 2.5),
        (-53, 8.645421567, 2.5),
        (-53, 15.954278592, 2.5),
        (-67.954278592, 1, 2.5),
        (-51, 8.645421567, 2.5),
        (-43.354578433, 1, 2.5),
        (-36.045721408, 1, 2.5),
        (-51, 15.954278592, 2.5),
    ]]
    fillet(fillet1_edges, radius=FILLET1_R)

    # Sketch6 → Cut-Extrude4 (cut)
    with BuildSketch(Plane(origin=(0, 0, 0), x_dir=(-1, 0, 0), z_dir=(0, 0, -1))):
        with Locations((-72.6, -28)):
            Circle(SKETCH6_R)
    extrude(amount=-CUT_EXTRUDE4_DEPTH, mode=Mode.SUBTRACT)


solid = part.part
